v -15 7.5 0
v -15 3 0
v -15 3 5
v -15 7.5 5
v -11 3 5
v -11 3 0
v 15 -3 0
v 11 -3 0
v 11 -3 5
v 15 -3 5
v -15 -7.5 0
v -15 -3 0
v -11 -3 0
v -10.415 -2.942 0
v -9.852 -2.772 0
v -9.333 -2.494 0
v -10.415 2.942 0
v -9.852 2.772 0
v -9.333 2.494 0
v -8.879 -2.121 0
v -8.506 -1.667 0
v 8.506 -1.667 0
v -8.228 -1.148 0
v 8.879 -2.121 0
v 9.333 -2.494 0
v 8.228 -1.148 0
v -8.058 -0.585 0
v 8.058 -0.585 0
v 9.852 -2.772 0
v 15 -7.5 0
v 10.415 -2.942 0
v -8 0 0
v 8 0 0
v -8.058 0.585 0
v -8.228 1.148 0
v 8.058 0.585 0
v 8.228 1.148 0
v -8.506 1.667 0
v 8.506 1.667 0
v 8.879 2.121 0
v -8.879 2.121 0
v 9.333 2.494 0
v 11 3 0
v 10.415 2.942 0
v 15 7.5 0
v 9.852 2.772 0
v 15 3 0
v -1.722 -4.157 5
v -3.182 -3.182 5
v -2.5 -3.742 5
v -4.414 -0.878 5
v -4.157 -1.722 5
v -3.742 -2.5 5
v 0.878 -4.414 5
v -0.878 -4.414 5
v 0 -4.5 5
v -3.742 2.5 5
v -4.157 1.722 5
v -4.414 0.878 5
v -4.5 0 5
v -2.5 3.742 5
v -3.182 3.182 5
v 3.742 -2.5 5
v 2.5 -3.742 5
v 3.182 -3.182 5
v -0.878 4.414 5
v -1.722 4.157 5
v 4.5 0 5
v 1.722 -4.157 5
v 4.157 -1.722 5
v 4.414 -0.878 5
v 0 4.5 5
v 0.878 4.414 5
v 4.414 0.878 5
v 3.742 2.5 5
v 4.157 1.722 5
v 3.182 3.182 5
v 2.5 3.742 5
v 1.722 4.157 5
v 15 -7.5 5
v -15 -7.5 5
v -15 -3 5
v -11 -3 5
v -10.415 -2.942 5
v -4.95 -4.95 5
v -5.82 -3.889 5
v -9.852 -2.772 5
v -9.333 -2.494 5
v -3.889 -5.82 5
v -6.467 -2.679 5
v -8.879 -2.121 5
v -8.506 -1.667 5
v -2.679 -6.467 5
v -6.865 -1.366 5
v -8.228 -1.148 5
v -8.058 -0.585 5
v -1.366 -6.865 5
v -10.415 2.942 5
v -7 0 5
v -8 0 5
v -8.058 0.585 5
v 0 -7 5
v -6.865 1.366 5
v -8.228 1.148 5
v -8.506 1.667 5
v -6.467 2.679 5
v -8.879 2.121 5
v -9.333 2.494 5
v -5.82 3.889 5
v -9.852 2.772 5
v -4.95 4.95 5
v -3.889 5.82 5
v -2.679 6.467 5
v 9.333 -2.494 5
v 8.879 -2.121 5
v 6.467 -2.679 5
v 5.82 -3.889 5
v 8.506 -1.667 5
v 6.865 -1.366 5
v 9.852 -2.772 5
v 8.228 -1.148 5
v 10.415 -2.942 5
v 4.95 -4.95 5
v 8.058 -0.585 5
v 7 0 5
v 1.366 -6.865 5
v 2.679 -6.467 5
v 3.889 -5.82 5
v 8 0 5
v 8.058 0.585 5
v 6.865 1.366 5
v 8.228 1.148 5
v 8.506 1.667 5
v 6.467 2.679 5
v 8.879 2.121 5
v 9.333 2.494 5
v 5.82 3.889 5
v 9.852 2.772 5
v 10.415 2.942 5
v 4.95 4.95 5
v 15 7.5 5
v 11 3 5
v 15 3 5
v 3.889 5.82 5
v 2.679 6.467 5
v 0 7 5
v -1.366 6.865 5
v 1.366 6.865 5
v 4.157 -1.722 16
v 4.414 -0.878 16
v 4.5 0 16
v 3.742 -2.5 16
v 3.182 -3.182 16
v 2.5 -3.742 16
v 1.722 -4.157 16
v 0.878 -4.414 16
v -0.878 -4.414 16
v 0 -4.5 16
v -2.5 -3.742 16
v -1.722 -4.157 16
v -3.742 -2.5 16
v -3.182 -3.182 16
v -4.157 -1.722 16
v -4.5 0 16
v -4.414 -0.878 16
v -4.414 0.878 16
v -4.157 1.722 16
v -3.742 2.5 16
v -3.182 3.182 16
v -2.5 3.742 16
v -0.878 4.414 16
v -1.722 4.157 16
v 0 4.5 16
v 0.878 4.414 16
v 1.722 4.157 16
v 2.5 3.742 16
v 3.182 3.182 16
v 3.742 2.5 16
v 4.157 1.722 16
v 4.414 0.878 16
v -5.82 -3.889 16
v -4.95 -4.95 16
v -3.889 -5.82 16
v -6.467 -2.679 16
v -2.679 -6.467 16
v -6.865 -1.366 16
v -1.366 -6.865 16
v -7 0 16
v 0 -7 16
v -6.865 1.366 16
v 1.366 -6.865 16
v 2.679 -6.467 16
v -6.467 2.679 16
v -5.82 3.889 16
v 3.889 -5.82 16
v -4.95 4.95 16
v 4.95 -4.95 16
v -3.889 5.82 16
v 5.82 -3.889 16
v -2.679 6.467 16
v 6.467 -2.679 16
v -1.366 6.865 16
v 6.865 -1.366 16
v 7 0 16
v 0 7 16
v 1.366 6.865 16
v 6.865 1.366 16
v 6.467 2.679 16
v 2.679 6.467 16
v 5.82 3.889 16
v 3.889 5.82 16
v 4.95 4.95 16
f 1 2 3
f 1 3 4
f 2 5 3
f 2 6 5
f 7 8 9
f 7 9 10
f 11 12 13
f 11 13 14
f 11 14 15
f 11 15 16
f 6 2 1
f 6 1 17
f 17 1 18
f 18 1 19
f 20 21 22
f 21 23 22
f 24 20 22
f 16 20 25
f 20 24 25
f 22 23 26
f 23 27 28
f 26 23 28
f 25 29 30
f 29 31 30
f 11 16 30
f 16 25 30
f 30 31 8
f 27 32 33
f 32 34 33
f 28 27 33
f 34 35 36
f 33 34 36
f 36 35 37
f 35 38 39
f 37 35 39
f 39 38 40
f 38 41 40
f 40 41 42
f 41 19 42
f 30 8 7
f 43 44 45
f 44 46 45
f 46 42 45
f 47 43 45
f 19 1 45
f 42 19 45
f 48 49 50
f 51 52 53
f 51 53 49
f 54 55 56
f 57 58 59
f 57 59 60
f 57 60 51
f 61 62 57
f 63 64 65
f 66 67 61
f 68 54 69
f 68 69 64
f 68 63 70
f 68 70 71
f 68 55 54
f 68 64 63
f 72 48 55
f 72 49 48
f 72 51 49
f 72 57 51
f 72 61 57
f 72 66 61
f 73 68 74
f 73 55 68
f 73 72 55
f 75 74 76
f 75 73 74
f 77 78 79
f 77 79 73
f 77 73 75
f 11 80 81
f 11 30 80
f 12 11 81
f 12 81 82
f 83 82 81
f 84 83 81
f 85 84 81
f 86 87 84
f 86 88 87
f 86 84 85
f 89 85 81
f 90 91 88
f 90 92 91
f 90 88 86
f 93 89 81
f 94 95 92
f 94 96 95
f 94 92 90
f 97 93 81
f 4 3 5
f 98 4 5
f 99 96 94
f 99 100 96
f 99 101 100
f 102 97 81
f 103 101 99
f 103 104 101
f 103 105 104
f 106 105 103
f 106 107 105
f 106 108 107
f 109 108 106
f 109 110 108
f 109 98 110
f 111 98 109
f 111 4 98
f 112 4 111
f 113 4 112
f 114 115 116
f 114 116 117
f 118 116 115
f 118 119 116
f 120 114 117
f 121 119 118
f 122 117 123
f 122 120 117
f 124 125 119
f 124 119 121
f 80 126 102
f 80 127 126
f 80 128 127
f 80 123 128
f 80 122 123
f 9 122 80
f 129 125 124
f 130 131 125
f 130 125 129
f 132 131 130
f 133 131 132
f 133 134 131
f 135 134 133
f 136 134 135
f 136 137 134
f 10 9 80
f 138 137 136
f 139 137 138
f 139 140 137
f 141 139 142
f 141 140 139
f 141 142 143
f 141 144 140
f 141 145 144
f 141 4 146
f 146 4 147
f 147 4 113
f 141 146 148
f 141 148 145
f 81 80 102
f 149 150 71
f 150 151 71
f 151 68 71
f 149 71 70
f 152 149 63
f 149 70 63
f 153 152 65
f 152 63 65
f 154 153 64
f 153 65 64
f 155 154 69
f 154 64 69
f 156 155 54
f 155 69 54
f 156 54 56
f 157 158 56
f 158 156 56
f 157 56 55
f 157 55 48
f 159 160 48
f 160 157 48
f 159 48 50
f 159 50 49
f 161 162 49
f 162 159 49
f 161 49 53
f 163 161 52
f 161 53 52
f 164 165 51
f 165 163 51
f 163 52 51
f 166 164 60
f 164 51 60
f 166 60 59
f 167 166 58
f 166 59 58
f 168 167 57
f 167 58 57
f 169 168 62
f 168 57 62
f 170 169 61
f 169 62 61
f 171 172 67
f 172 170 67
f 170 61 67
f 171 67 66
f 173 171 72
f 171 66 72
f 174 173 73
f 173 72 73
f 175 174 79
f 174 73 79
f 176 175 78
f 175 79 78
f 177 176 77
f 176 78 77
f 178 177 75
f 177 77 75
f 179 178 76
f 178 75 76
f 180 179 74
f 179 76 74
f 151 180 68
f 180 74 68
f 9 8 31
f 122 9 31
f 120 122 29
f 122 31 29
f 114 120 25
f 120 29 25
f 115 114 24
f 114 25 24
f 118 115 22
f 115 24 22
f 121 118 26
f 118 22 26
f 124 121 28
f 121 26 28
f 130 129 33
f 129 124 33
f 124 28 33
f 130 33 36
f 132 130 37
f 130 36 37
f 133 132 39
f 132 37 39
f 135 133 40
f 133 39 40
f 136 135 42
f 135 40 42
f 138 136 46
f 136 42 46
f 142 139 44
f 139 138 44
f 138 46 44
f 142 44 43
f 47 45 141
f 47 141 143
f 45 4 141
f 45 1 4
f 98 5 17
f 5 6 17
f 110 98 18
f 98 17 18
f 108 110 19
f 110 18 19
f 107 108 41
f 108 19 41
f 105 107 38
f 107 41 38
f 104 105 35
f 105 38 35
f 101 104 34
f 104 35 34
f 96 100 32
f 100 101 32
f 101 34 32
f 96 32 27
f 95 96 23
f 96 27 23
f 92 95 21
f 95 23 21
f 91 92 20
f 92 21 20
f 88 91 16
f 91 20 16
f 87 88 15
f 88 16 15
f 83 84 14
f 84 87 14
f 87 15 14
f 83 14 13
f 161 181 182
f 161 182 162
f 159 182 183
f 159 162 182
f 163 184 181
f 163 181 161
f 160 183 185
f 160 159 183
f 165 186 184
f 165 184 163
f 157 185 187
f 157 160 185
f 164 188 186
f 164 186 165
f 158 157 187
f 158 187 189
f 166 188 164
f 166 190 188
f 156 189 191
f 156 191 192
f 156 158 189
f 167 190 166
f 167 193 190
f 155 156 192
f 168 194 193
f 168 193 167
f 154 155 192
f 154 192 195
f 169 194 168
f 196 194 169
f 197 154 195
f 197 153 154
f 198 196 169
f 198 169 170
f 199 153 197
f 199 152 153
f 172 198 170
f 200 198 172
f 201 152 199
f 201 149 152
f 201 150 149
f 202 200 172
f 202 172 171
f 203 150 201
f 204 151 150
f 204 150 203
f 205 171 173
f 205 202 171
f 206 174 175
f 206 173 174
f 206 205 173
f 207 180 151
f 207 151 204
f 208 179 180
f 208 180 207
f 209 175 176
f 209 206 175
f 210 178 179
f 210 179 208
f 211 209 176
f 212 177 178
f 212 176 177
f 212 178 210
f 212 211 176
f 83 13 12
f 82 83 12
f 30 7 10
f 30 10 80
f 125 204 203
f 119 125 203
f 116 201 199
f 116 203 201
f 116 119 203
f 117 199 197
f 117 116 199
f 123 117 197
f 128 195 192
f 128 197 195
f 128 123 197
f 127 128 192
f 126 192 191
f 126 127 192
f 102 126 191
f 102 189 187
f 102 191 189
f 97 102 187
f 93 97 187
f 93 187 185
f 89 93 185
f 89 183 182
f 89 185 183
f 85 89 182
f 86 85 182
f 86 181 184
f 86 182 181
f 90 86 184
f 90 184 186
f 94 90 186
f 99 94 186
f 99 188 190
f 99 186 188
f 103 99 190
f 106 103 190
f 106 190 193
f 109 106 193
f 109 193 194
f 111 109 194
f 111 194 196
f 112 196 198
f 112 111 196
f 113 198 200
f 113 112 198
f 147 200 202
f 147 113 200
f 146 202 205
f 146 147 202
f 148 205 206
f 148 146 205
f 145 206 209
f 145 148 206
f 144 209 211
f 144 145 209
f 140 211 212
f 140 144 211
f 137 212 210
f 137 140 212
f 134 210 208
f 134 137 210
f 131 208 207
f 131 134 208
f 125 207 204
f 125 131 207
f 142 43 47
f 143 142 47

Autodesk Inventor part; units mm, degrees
ref_plane "YZ Plane" through (0, 0, 0) normal (1, 0, 0) x (0, 1, 0)
ref_plane "XZ Plane" through (0, 0, 0) normal (0, 1, 0) x (-1, 0, 0)
ref_plane "XY Plane" through (0, 0, 0) normal (0, 0, 1) x (1, 0, 0)
sketch "草图1" plane through (0, 0, 0) normal (0, 0, 1) x (1, 0, 0)
  line L0 (-15, 7.5) -> (15, 7.5)
  line L1 (15, -7.5) -> (-15, -7.5)
  line L2 (-15, 7.5) -> (15, -7.5) construction
  line L3 (15, 7.5) -> (-15, -7.5) construction
  arc A0 (11, 3) -> (11, -3) centre (11, 0) ccw
  arc A1 (-11, -3) -> (-11, 3) centre (-11, 0) ccw
  line L4 (-11, 3) -> (-15, 3)
  line L5 (-11, -3) -> (-15, -3)
  line L6 (11, 3) -> (15, 3)
  line L7 (11, -3) -> (15, -3)
  line L8 (-15, -7.5) -> (-15, -3)
  line L9 (-15, 3) -> (-15, 7.5)
  line L10 (15, 7.5) -> (15, 3)
  line L11 (15, -3) -> (15, -7.5)
  point P0 (0, 0)
  dimension "d0" = 30
  dimension "d1" = 15
  dimension "d4" = 6
  dimension "d5" = 6
  dimension "d6" = 22
  dimension "d7" = 63.435
  dimension "d8" = 63.435
  dimension "d9" = 4.5
  dimension "d10" = 4
  dimension "d11" = 4
extrude "拉伸1" add sketch "草图1" along normal blind 5
sketch "草图2" plane through (0, 0, 5) normal (0, 0, 1) x (1, 0, 0)
  circle A0 centre (0, 0) radius 4.5
  circle A1 centre (0, 0) radius 7
  dimension "d14" = 9
  dimension "d15" = 14
extrude "拉伸2" add sketch "草图2" along normal blind 11
properties part number "2-3"
